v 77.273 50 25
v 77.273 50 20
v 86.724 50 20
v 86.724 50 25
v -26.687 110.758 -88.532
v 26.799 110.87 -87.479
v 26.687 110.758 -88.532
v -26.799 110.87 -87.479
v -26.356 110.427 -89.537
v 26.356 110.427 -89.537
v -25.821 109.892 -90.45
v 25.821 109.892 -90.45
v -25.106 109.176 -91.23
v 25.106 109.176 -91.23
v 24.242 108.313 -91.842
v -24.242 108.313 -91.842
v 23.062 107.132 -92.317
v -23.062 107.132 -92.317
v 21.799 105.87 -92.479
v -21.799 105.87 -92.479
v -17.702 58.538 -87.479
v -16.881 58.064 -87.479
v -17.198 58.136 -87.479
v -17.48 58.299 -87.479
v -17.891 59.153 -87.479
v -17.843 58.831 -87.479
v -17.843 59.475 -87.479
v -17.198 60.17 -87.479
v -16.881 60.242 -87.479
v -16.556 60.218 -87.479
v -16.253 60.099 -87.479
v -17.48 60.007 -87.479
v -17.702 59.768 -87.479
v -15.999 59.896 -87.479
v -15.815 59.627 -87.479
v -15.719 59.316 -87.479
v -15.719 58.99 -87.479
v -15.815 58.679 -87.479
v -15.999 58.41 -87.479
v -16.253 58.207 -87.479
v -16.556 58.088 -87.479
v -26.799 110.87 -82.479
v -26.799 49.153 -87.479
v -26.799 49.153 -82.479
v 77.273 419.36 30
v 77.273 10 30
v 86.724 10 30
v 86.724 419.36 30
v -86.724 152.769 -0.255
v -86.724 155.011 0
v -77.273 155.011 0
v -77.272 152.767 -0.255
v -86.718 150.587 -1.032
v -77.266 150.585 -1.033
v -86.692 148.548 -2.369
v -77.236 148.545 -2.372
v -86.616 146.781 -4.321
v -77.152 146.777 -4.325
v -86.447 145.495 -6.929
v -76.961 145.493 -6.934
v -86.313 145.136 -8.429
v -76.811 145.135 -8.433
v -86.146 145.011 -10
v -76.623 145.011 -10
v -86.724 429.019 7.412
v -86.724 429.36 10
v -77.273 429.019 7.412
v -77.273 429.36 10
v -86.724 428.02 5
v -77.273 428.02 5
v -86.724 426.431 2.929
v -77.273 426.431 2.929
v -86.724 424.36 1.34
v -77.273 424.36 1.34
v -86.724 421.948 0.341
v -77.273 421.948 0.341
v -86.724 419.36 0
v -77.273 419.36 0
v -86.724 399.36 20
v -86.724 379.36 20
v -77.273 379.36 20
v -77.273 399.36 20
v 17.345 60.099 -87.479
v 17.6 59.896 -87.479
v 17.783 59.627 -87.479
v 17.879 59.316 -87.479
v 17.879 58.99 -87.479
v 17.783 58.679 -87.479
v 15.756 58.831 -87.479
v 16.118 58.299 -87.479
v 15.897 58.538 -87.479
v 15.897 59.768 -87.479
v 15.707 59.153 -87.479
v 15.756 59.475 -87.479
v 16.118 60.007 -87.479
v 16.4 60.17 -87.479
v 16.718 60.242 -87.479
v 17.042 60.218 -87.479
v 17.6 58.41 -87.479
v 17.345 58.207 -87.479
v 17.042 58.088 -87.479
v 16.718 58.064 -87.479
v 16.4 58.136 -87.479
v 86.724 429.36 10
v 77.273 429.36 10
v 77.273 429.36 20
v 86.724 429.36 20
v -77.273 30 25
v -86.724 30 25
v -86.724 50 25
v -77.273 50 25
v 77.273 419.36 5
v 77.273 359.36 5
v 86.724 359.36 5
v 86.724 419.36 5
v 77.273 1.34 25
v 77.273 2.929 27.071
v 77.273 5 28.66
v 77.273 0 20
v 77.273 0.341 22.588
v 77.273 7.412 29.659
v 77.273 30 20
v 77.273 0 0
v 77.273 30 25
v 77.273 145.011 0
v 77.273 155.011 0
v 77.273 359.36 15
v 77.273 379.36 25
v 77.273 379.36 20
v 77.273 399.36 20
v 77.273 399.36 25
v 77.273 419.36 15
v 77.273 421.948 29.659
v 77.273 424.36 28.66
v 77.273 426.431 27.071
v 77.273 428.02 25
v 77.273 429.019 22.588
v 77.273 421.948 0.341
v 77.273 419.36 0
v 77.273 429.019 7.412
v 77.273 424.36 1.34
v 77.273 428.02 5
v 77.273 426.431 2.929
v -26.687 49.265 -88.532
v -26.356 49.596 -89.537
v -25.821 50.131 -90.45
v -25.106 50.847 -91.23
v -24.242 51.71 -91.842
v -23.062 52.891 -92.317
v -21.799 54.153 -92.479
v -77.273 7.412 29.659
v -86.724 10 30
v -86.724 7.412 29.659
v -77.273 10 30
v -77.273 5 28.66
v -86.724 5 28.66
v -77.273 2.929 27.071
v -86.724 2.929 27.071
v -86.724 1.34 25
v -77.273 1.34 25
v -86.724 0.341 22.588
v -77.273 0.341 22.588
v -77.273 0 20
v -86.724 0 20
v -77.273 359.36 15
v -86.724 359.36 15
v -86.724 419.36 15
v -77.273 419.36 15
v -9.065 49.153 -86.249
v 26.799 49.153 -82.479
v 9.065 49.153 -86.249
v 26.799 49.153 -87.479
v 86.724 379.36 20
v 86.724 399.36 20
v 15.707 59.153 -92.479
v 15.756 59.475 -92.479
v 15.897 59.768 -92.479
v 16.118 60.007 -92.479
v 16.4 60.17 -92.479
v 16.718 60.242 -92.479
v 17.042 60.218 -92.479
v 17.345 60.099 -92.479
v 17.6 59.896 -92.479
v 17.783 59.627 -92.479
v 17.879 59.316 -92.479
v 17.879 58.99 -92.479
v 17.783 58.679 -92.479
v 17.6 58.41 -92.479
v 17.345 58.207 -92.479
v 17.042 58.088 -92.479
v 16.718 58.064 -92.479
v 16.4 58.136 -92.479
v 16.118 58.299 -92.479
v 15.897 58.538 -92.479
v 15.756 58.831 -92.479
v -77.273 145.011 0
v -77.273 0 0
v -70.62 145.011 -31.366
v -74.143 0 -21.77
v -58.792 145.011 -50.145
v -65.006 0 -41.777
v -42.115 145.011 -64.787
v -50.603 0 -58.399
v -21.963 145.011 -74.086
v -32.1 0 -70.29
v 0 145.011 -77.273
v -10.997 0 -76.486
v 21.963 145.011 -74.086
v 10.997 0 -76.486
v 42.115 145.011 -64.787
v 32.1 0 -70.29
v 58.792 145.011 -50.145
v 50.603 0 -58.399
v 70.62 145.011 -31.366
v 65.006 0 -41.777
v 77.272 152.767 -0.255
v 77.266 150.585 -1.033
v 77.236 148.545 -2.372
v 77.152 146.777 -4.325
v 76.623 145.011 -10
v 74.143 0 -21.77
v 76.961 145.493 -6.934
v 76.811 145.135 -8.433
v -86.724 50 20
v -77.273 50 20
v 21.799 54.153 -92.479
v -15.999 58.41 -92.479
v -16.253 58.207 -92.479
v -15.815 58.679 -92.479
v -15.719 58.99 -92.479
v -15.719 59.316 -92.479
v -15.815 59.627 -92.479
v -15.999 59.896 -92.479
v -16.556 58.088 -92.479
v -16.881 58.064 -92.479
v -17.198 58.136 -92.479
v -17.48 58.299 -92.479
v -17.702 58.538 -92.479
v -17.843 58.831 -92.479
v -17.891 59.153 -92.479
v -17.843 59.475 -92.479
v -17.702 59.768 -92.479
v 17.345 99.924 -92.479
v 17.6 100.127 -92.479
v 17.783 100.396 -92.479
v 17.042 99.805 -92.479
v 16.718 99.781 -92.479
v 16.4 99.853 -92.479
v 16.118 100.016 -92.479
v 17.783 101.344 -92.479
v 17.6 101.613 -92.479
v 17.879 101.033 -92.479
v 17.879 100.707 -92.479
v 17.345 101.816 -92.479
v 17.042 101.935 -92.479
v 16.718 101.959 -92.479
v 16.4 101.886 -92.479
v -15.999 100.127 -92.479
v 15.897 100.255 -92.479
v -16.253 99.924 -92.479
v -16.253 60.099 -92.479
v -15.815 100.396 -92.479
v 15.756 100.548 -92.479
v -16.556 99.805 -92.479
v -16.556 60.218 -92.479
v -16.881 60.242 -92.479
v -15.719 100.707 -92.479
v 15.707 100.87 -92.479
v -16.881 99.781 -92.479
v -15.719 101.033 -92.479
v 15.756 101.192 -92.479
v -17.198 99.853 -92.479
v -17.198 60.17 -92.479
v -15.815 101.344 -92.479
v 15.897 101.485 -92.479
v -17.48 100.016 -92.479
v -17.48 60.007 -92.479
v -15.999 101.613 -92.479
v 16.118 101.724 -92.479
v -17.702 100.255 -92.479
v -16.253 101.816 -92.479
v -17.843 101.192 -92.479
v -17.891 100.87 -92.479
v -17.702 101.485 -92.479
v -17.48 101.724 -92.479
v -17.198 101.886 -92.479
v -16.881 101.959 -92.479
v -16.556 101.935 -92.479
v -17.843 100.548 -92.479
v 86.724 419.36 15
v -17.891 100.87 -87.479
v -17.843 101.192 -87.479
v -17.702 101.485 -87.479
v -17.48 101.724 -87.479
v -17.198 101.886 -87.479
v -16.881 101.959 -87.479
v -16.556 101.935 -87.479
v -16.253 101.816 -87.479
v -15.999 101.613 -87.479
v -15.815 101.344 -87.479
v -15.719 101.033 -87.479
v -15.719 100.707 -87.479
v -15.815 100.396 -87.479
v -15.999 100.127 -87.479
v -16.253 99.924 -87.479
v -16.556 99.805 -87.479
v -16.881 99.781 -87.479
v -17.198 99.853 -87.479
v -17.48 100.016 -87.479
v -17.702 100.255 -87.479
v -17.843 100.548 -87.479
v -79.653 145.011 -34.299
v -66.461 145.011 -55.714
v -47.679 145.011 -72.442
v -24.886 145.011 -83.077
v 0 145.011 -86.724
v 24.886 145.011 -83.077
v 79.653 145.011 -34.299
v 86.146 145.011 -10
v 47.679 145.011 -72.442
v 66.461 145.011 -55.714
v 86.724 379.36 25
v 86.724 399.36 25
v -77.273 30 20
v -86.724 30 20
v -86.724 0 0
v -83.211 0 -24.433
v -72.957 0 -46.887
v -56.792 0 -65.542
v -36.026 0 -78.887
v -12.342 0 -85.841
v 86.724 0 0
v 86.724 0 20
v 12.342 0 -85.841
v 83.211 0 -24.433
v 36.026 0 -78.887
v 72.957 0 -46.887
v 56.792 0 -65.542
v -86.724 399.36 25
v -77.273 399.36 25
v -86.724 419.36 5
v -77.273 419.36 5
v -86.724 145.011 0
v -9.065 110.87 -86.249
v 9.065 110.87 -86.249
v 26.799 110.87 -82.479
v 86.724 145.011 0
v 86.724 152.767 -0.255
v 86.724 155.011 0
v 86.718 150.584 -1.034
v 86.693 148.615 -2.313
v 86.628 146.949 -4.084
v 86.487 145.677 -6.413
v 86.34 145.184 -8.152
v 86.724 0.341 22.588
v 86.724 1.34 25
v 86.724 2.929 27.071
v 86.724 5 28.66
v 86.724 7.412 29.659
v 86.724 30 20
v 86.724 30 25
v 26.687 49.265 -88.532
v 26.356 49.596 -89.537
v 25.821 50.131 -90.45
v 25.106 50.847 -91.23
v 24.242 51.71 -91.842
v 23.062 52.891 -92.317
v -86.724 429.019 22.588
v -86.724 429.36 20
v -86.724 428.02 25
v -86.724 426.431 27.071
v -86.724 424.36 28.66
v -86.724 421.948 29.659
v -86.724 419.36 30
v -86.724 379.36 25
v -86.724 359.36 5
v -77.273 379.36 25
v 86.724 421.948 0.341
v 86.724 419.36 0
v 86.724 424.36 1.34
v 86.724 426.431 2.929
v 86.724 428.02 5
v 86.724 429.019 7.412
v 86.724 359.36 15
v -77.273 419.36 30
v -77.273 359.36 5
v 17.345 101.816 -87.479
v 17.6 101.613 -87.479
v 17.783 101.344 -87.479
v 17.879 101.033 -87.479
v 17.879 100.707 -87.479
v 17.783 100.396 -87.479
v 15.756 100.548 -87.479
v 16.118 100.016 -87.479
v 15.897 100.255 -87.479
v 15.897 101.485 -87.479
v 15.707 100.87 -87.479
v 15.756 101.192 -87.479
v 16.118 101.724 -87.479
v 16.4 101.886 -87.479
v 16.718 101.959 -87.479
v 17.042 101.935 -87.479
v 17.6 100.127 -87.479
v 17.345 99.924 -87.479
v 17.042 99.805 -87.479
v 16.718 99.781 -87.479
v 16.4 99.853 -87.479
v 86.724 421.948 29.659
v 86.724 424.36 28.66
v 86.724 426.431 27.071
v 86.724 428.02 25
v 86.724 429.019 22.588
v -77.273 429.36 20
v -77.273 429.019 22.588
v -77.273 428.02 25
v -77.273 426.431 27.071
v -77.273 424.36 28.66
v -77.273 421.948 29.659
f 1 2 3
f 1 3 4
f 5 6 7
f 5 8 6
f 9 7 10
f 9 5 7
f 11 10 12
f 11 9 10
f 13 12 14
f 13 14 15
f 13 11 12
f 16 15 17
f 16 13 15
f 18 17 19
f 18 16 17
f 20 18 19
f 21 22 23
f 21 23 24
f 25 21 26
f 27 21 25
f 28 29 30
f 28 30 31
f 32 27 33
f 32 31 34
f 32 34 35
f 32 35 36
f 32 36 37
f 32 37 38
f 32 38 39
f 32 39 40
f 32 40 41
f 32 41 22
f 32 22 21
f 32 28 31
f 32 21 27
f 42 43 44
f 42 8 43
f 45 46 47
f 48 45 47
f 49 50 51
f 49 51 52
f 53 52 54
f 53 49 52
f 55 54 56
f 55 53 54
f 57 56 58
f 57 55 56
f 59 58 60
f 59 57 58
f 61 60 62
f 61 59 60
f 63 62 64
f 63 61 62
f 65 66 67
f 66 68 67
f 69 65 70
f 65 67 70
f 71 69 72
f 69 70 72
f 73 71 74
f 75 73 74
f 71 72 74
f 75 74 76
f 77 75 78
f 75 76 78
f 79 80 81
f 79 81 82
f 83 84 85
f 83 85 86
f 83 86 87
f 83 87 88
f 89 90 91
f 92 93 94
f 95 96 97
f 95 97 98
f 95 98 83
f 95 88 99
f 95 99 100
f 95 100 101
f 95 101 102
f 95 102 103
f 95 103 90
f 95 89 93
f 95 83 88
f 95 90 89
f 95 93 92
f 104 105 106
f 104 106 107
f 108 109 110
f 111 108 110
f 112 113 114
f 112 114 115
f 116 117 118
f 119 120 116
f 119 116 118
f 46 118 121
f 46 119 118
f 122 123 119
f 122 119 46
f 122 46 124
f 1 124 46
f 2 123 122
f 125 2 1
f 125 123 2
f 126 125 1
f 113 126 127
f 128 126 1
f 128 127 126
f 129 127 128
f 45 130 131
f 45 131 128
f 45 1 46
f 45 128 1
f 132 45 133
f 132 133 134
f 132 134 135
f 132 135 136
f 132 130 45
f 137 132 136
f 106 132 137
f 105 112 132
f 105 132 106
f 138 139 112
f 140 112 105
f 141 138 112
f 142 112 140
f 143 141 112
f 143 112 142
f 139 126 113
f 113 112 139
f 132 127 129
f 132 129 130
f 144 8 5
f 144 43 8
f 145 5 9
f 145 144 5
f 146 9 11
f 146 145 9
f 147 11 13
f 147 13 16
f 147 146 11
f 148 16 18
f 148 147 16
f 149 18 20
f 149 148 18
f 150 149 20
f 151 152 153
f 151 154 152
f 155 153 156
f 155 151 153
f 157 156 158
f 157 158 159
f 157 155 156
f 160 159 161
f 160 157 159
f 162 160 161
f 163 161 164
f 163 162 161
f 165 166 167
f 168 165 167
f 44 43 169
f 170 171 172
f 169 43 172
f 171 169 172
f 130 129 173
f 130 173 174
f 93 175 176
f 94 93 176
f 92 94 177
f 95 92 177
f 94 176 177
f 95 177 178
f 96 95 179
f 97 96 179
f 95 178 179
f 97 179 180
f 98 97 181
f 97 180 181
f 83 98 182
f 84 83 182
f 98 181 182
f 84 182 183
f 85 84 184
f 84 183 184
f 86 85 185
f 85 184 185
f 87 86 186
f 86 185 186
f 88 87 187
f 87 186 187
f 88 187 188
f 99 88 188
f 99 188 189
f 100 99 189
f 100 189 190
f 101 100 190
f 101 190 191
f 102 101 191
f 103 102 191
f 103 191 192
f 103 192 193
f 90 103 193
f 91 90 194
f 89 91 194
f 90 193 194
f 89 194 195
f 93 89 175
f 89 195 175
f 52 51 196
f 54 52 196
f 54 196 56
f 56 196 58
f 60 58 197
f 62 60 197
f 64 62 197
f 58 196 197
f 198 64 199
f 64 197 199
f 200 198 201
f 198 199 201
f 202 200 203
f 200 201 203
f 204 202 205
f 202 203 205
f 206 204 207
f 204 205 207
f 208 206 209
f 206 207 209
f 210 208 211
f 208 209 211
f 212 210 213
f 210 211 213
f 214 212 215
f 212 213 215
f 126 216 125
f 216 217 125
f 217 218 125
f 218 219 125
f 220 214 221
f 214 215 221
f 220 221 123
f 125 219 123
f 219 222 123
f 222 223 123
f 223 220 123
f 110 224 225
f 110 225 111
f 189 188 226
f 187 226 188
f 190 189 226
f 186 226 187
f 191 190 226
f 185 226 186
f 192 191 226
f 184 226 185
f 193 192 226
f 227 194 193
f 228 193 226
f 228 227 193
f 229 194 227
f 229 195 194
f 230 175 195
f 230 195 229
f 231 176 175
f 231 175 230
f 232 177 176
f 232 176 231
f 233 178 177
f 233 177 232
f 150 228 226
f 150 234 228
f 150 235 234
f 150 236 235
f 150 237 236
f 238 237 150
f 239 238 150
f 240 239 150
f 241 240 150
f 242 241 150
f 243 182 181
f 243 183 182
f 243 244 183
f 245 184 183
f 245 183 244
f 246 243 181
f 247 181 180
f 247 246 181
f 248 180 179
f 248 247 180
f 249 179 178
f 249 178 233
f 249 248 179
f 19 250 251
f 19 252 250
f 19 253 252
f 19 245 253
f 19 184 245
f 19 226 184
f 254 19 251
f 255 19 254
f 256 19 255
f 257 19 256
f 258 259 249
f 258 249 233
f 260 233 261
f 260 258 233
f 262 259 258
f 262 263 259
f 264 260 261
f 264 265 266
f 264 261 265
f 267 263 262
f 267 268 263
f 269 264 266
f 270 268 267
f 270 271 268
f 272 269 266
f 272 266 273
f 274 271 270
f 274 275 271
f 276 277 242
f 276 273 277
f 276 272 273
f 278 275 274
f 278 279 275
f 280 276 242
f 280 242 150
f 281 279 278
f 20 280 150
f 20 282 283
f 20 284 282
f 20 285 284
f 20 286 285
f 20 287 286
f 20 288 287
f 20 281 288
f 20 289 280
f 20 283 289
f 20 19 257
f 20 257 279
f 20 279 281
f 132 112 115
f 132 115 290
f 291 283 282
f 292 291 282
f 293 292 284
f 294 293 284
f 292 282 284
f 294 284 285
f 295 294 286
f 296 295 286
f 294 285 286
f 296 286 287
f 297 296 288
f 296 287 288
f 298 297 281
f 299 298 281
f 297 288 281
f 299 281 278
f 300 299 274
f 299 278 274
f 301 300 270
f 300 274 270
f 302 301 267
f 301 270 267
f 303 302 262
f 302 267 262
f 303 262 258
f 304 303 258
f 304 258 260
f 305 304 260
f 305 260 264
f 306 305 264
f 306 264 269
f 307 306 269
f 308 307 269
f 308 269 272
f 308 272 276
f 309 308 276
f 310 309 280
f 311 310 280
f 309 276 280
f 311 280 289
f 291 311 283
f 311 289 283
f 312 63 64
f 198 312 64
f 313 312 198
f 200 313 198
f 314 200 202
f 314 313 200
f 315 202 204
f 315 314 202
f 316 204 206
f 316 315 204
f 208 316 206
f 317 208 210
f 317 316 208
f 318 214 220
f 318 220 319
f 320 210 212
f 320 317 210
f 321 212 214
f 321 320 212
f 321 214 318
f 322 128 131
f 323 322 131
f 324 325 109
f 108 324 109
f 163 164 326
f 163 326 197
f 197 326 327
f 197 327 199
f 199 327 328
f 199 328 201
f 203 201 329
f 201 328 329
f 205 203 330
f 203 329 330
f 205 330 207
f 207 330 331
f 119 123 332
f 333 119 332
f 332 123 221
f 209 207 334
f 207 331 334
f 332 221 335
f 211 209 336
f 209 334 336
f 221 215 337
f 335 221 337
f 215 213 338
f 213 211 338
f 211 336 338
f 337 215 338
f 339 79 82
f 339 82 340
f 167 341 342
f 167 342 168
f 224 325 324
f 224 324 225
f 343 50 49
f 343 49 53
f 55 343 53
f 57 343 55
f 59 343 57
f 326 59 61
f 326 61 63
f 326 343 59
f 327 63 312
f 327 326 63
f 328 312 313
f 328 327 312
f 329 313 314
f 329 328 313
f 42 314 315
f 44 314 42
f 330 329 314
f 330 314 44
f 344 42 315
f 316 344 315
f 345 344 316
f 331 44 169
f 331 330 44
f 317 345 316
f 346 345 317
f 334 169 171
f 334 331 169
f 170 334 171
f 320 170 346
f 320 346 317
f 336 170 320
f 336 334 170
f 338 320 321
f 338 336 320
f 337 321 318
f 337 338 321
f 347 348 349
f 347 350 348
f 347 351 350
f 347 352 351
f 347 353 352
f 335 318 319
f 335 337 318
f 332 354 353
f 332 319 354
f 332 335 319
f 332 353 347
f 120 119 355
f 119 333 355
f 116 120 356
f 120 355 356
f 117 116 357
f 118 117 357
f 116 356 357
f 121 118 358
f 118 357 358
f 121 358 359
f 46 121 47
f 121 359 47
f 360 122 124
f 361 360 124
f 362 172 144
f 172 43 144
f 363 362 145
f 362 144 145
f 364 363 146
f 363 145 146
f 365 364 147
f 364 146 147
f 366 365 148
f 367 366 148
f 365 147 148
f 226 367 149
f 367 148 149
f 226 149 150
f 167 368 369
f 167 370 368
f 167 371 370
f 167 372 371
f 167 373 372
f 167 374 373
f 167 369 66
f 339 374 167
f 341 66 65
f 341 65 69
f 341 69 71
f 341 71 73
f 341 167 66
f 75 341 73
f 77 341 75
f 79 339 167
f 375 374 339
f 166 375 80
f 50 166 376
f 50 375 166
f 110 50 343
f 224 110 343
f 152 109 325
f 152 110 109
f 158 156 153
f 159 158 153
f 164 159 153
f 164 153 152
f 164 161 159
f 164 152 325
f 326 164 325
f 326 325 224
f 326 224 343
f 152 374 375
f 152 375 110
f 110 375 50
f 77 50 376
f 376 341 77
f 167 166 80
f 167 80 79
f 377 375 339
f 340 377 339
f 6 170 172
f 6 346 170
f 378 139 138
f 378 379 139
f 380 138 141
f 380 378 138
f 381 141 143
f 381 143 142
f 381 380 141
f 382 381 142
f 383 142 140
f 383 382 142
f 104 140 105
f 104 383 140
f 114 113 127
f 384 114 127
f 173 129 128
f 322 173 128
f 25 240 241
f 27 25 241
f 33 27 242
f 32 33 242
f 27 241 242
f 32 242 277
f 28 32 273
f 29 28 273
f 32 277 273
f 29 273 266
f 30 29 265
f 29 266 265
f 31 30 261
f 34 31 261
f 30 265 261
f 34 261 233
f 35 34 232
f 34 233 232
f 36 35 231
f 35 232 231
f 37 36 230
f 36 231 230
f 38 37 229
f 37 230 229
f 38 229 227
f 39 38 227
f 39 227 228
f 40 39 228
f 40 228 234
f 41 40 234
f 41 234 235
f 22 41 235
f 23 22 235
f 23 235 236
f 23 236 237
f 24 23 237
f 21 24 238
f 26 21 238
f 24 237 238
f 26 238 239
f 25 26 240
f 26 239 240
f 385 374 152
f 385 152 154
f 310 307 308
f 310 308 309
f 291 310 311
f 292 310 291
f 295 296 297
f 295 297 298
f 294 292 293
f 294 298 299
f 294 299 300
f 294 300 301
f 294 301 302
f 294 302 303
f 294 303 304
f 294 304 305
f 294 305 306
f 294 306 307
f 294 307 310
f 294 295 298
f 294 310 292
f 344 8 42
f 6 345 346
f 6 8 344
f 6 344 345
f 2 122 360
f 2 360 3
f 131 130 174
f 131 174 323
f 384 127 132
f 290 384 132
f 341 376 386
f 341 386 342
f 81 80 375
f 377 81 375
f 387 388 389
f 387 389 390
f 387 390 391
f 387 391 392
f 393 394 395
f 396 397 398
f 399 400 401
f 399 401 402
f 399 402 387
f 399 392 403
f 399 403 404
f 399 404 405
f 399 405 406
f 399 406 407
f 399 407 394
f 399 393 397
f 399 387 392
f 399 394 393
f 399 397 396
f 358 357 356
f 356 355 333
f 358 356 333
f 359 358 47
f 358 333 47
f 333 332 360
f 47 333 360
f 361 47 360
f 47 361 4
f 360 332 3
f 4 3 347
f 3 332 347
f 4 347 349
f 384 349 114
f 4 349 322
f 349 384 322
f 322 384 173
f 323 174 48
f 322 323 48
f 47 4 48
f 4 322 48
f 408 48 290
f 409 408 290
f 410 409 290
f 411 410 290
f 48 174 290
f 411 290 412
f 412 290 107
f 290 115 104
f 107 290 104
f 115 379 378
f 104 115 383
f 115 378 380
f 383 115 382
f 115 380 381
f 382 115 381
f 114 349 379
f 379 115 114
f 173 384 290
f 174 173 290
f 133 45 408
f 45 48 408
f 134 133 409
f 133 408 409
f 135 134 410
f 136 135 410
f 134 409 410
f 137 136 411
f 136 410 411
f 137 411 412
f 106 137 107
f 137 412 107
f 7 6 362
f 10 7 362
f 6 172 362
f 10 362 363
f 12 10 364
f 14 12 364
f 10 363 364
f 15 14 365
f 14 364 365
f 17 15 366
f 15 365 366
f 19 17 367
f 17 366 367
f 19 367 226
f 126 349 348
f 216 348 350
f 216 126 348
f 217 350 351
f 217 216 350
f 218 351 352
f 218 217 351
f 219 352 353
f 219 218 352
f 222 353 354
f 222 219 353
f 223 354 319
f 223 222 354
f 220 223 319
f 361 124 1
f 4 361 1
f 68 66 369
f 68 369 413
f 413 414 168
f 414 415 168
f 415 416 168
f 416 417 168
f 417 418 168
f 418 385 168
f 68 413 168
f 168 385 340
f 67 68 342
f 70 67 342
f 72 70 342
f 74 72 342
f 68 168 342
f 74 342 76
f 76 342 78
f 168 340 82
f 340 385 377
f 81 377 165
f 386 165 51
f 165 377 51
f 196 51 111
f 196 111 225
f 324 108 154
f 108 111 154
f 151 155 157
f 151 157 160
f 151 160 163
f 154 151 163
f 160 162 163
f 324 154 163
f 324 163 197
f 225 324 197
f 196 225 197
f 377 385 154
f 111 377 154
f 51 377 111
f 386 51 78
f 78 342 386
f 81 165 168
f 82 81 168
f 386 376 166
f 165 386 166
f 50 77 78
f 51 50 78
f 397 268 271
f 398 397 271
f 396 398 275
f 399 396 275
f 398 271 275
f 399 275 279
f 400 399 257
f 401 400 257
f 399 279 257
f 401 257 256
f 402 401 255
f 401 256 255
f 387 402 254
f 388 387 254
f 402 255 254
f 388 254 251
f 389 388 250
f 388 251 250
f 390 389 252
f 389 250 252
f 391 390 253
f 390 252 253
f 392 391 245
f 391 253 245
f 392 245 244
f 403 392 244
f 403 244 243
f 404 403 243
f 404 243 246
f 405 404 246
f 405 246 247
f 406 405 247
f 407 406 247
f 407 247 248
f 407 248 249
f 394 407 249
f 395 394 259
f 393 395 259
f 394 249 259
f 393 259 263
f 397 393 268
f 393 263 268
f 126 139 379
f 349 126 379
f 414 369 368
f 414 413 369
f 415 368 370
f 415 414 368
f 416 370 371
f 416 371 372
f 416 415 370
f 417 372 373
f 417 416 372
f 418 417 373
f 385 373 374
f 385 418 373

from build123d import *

# Parameters (mm, degrees)
BOSS_EXTRUDE1_DEPTH = 145.01147666
SKETCH2_W           = 9.451272727
SKETCH2_H           = 145.01147666
BOSS_EXTRUDE2_DEPTH = 30
SKETCH3_W           = 9.451272727
SKETCH3_H           = 30
BOSS_EXTRUDE3_DEPTH = 284.3485
SKETCH5_W           = 10
SKETCH5_H           = 60
CUT_EXTRUDE1_DEPTH  = 240
SKETCH6_W           = 5
SKETCH6_H           = 20
CUT_EXTRUDE2_DEPTH  = 472.121269354
FILLET1_R           = 10
FILLET2_R           = 10
FILLET3_R           = 10
SKETCH8_W           = 5
SKETCH8_H           = 20
CUT_EXTRUDE3_DEPTH  = 472.121269409
BOSS_EXTRUDE4_DEPTH = 30.8583
FILLET4_R           = 5
SKETCH10_R          = 1.0922
CUT_EXTRUDE4_DEPTH  = 5


with BuildPart() as part:
    # Sketch1 → Boss-Extrude1 (new body)
    with BuildSketch(Plane(origin=(0, 0, 0), x_dir=(1, 0, 0), z_dir=(0, 1, 0))):
        with BuildLine():
            Line((-77.272727273, 0), (-86.724, 0))
            ThreePointArc((-86.724, 0), (0, 86.724), (86.724, 0))
            Line((86.724, 0), (77.272727273, 0))
            ThreePointArc((77.272727273, 0), (0, 77.272727273), (-77.272727273, 0))
        make_face()
    extrude(amount=BOSS_EXTRUDE1_DEPTH)

    # Sketch2 → Boss-Extrude2 (add)
    with BuildSketch(Plane.XY):
        with Locations((81.998363637, 72.50573833)):
            Rectangle(SKETCH2_W, SKETCH2_H)
        with Locations((-81.998363637, 72.50573833)):
            Rectangle(SKETCH2_W, SKETCH2_H)
    extrude(amount=BOSS_EXTRUDE2_DEPTH)

    # Sketch3 → Boss-Extrude3 (add)
    with BuildSketch(Plane(origin=(0, 145.01147666, 0), x_dir=(1, 0, 0), z_dir=(0, 1, 0))):
        with Locations((-81.998363637, -15)):
            Rectangle(SKETCH3_W, SKETCH3_H)
        with Locations((81.998363637, -15)):
            Rectangle(SKETCH3_W, SKETCH3_H)
    extrude(amount=BOSS_EXTRUDE3_DEPTH)

    # Sketch5 → Cut-Extrude1 (cut)
    with BuildSketch(Plane.ZY.offset(86.724)):
        with Locations((10, 389.35997666)):
            Rectangle(SKETCH5_W, SKETCH5_H)
    extrude(amount=-CUT_EXTRUDE1_DEPTH, mode=Mode.SUBTRACT)

    # Sketch6 → Cut-Extrude2 (cut, through all)
    with BuildSketch(Plane.ZY.offset(86.724)):
        with Locations((22.5, 389.35997666)):
            Rectangle(SKETCH6_W, SKETCH6_H)
    extrude(amount=-CUT_EXTRUDE2_DEPTH, mode=Mode.SUBTRACT)

    # Fillet1
    fillet1_edges = [part.edges().sort_by_distance(p)[0] for p in [
        (-81.998363636, 429.35997666, 0),
        (-81.998363636, 429.35997666, 30),
        (81.998363636, 429.35997666, 0),
        (81.998363636, 429.35997666, 30),
    ]]
    fillet(fillet1_edges, radius=FILLET1_R)

    # Fillet2
    fillet2_edges = [part.edges().sort_by_distance(p)[0] for p in [
        (81.998363636, 0, 30),
        (-81.998363636, 0, 30),
    ]]
    fillet(fillet2_edges, radius=FILLET2_R)

    # Fillet3
    # the kernel refuses this fillet: 10 mm, written as the material it adds along each edge
    with BuildSketch(Plane(origin=(-111.724, 145.01147666, 0), x_dir=(0, 1, 0), z_dir=(1, 0, 0))) as fillet3_piece_1_section:
        with BuildLine():
            CenterArc((FILLET3_R, -FILLET3_R), FILLET3_R, 90, 90)
            Line((0, -FILLET3_R), (0, 0))
            Line((0, 0), (FILLET3_R, 0))
        make_face()
    fillet3_piece_1 = extrude(amount=59.451272727, mode=Mode.PRIVATE)
    fillet3_piece_1 = fillet3_piece_1 & Plane(origin=(0, 147.252284307, 0), x_dir=(-1, 0, 0), z_dir=(0, -1, 0)) * Cylinder(86.724, 159, mode=Mode.PRIVATE)
    fillet3_piece_1 = fillet3_piece_1 - Plane(origin=(0, 147.252284307, 0), x_dir=(1, 0, 0), z_dir=(0, -1, 0)) * Cylinder(77.272727273, 159, mode=Mode.PRIVATE)
    add(fillet3_piece_1)
    with BuildSketch(Plane(origin=(52.272727273, 145.01147666, 0), x_dir=(0, 0, -1), z_dir=(1, 0, 0))) as fillet3_piece_2_section:
        with BuildLine():
            CenterArc((FILLET3_R, FILLET3_R), FILLET3_R, 180, 90)
            Line((0, FILLET3_R), (0, 0))
            Line((0, 0), (FILLET3_R, 0))
        make_face()
    fillet3_piece_2 = extrude(amount=59.451272727, mode=Mode.PRIVATE)
    fillet3_piece_2 = fillet3_piece_2 & Plane(origin=(0, 145.87973925, 0), x_dir=(-1, 0, 0), z_dir=(0, -1, 0)) * Cylinder(86.724, 159, mode=Mode.PRIVATE)
    fillet3_piece_2 = fillet3_piece_2 - Plane(origin=(0, 145.87973925, 0), x_dir=(1, 0, 0), z_dir=(0, -1, 0)) * Cylinder(77.272727273, 159, mode=Mode.PRIVATE)
    add(fillet3_piece_2)

    # Sketch8 → Cut-Extrude3 (cut, through all)
    with BuildSketch(Plane.ZY.offset(86.724)):
        with Locations((22.5, 40)):
            Rectangle(SKETCH8_W, SKETCH8_H)
    extrude(amount=-CUT_EXTRUDE3_DEPTH, mode=Mode.SUBTRACT)

    # Sketch9 → Boss-Extrude4 (add, symmetric)
    with BuildSketch(Plane(origin=(0, 80.01147666, 0), x_dir=(1, 0, 0), z_dir=(0, 1, 0))):
        with BuildLine():
            Line((-26.79918982, 92.479425319), (-26.79918982, 82.479425319))
            ThreePointArc((-26.79918982, 82.479425319), (0, 86.724), (26.79918982, 82.479425319))
            Line((26.79918982, 82.479425319), (26.79918982, 92.479425319))
            Line((26.79918982, 92.479425319), (-26.79918982, 92.479425319))
        make_face()
    extrude(amount=BOSS_EXTRUDE4_DEPTH, both=True)

    # Fillet4
    fillet4_edges = [part.edges().sort_by_distance(p)[0] for p in [
        (0, 110.86977666, -92.479425319),
        (26.79918982, 80.01147666, -92.479425319),
        (-26.79918982, 80.01147666, -92.479425319),
        (0, 49.15317666, -92.479425319),
    ]]
    fillet(fillet4_edges, radius=FILLET4_R)

    # Sketch10 → Cut-Extrude4 (cut)
    with BuildSketch(Plane(origin=(0, 0, -92.479425319), x_dir=(-1, 0, 0), z_dir=(0, 0, -1))):
        with Locations((-16.79918982, 100.86977666)):
            Circle(SKETCH10_R)
        with Locations((16.79918982, 100.86977666)):
            Circle(SKETCH10_R)
        with Locations((-16.79918982, 59.15317666)):
            Circle(SKETCH10_R)
        with Locations((16.79918982, 59.15317666)):
            Circle(SKETCH10_R)
    extrude(amount=-CUT_EXTRUDE4_DEPTH, mode=Mode.SUBTRACT)


solid = part.part
